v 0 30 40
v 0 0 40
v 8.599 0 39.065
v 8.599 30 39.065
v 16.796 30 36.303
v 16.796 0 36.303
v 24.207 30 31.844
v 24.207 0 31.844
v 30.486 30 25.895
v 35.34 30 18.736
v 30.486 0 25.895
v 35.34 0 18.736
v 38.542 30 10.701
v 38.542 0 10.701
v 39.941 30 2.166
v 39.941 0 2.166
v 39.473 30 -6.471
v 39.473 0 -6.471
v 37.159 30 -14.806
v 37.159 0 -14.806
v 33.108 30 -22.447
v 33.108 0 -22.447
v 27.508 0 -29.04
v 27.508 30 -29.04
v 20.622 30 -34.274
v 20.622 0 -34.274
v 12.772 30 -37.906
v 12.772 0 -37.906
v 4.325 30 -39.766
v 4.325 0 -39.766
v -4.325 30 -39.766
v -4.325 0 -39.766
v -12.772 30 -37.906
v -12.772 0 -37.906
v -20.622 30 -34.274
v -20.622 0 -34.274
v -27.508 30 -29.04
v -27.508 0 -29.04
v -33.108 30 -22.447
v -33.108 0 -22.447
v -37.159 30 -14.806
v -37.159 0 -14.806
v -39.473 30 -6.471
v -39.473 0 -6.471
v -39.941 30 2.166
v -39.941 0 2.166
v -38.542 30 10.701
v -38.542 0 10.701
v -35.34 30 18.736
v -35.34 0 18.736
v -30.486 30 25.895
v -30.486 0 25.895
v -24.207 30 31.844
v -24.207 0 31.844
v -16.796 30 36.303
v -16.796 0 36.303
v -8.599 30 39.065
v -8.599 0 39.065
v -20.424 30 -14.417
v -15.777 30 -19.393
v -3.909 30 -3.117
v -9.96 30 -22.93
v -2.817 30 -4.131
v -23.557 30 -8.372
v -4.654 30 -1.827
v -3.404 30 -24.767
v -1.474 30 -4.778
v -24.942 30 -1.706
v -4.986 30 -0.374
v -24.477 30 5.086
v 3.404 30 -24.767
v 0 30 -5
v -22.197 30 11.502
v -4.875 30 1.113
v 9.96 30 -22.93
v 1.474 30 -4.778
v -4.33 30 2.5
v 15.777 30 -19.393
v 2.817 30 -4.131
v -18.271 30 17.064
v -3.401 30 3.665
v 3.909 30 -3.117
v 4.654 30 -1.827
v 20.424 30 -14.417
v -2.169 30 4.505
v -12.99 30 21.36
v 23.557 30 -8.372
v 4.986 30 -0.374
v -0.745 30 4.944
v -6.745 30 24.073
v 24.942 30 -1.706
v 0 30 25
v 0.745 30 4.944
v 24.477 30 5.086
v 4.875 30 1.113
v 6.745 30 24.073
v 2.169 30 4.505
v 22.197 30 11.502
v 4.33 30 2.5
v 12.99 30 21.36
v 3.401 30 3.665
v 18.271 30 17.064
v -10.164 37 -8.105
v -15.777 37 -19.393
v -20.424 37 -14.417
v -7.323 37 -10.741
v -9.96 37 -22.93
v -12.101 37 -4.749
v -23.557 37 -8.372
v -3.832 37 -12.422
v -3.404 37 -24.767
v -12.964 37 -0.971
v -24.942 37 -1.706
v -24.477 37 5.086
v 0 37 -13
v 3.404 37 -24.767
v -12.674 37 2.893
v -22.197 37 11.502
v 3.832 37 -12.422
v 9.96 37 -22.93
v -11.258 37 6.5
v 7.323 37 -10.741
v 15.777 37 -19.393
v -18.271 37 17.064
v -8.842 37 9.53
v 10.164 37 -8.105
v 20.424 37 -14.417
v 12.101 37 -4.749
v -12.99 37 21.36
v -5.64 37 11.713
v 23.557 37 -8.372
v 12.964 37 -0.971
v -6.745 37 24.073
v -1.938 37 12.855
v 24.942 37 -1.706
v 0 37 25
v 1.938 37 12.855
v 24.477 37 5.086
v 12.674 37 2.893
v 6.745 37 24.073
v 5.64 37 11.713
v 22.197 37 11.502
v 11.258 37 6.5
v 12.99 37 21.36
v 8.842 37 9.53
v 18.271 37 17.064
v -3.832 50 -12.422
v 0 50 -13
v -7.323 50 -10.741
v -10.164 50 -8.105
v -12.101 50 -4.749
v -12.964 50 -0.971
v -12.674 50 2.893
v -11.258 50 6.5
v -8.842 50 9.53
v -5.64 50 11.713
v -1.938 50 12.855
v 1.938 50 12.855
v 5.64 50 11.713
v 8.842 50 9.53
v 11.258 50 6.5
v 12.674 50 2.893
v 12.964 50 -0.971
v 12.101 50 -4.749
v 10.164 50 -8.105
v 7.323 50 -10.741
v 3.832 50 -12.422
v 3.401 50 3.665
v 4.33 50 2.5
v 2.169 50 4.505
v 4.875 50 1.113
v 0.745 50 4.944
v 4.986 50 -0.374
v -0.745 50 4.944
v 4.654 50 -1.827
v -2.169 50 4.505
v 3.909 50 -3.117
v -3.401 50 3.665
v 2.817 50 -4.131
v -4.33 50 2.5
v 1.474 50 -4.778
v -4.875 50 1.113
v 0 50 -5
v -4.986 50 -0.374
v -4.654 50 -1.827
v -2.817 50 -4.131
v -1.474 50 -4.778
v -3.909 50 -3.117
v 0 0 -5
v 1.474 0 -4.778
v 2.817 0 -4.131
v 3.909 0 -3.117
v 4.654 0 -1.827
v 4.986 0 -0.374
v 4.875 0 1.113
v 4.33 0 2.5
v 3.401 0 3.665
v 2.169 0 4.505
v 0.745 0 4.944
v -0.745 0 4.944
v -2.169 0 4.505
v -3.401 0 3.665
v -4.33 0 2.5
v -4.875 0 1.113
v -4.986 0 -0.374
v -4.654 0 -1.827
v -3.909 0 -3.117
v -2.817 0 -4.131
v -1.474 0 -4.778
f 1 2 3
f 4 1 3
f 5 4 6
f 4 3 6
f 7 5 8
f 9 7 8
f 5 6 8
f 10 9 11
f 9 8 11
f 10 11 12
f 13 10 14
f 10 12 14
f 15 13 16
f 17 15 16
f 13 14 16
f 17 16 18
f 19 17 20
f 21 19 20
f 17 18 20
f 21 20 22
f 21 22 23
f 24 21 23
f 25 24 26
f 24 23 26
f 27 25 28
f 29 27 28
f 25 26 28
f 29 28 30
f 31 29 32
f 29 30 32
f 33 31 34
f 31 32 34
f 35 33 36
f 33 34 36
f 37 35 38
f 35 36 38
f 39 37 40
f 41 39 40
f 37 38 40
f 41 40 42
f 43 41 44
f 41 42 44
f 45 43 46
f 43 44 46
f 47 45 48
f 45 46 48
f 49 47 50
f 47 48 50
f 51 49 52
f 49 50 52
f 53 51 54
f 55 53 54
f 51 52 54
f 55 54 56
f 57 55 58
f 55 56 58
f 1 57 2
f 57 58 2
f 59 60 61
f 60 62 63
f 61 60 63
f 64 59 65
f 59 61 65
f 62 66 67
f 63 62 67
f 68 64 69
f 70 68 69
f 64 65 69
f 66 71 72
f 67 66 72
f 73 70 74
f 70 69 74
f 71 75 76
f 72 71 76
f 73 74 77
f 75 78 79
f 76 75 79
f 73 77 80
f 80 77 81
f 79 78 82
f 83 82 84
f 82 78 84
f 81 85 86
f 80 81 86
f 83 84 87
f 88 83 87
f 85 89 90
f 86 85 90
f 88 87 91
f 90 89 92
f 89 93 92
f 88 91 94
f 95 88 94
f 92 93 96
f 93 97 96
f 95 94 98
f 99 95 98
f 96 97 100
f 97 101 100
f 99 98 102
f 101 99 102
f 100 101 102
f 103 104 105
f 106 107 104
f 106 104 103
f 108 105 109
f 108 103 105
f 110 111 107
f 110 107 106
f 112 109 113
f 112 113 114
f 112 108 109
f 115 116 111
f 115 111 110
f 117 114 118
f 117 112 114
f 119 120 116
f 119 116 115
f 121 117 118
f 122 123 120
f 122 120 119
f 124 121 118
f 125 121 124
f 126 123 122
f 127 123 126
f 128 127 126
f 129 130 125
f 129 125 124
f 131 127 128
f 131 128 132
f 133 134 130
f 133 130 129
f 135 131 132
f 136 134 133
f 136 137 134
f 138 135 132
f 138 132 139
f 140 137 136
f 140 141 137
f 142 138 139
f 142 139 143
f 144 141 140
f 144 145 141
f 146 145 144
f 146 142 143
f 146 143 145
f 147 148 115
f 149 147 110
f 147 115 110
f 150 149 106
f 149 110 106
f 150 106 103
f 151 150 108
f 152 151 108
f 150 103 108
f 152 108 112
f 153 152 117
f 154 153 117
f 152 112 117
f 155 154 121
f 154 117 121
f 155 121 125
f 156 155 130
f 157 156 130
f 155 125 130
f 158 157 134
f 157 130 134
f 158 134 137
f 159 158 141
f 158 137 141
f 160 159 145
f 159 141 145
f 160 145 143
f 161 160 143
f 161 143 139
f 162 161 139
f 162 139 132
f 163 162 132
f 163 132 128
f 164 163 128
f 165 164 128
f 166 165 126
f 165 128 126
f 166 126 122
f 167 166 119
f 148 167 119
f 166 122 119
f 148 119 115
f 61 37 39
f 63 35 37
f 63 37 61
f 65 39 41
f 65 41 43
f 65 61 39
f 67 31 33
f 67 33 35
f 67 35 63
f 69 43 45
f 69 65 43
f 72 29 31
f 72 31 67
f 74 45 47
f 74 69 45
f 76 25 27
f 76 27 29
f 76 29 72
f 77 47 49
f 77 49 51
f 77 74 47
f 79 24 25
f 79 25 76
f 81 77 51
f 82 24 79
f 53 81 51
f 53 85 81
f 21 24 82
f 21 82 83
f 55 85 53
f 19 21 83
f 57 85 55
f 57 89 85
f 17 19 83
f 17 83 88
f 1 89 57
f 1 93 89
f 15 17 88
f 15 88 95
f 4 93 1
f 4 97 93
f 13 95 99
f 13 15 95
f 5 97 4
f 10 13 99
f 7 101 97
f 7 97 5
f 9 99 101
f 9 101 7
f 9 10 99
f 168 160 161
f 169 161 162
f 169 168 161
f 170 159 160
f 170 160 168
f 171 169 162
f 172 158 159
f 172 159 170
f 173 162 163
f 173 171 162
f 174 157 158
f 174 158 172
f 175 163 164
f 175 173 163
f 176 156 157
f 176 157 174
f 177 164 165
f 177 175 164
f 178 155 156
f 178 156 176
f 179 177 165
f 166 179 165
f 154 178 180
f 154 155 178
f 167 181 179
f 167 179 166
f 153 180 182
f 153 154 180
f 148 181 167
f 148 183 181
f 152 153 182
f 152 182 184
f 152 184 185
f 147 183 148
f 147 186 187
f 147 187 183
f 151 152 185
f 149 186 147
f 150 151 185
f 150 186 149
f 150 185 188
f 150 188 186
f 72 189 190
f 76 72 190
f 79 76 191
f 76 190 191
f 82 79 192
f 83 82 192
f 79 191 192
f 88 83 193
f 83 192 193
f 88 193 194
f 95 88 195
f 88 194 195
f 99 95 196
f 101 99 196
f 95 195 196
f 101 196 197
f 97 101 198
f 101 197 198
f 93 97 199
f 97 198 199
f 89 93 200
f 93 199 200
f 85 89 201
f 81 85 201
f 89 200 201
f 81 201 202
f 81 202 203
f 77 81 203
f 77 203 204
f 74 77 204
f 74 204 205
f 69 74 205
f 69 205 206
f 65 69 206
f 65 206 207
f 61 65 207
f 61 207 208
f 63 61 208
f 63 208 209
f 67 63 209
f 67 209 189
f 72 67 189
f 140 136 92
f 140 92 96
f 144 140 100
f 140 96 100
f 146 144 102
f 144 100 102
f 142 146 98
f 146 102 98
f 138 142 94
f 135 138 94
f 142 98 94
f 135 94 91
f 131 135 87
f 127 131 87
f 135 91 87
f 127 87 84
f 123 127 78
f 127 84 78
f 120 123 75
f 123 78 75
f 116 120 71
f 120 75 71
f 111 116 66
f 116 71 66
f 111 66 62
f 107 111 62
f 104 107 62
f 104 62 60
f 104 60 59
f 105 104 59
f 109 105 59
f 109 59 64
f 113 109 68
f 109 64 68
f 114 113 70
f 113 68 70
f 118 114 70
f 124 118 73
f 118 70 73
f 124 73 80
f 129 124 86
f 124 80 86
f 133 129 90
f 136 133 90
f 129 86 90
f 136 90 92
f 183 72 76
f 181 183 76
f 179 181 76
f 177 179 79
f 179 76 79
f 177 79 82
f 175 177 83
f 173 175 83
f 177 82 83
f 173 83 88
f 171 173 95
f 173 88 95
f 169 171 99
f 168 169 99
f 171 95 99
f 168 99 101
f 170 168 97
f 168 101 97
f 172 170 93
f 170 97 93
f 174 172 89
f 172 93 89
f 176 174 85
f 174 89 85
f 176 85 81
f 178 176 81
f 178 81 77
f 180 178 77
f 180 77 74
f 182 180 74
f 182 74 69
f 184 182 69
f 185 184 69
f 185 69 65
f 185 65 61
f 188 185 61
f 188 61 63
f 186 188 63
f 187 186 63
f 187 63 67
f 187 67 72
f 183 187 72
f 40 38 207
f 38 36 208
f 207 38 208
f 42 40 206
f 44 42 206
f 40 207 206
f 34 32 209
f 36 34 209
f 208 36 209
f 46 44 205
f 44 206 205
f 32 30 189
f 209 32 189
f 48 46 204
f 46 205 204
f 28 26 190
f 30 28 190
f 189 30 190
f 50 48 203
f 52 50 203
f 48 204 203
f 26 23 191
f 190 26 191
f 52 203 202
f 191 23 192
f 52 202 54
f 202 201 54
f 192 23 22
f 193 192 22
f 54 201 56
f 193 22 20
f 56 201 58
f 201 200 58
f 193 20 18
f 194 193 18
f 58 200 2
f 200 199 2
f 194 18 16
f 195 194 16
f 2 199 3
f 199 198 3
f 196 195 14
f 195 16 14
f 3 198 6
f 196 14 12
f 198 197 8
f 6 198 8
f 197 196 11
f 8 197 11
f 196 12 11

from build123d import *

# Parameters (mm, degrees)
SKETCH1_R           = 40
BOSS_EXTRUDE1_DEPTH = 30
SKETCH2_R           = 25
BOSS_EXTRUDE3_DEPTH = 7
SKETCH3_R           = 13
BOSS_EXTRUDE4_DEPTH = 13
SKETCH4_R           = 5
CUT_EXTRUDE2_DEPTH  = 50


with BuildPart() as part:
    # Sketch1 → Boss-Extrude1 (new body)
    with BuildSketch(Plane(origin=(0, 0, 0), x_dir=(1, 0, 0), z_dir=(0, 1, 0))):
        with Locations(Location((0, 0, 0), (0, 0, 270))):
            Circle(SKETCH1_R)
    extrude(amount=BOSS_EXTRUDE1_DEPTH)


with BuildPart() as body_2:
    # Sketch2 → Boss-Extrude3 (new body)
    with BuildSketch(Plane(origin=(0, 30, 0), x_dir=(1, 0, 0), z_dir=(0, 1, 0))):
        with Locations(Location((0, 0, 0), (0, 0, 270))):
            Circle(SKETCH2_R)
    extrude(amount=BOSS_EXTRUDE3_DEPTH)

    # Sketch3 → Boss-Extrude4 (add)
    with BuildSketch(Plane(origin=(0, 37, 0), x_dir=(1, 0, 0), z_dir=(0, 1, 0))):
        with Locations(Location((0, 0, 0), (0, 0, 90))):
            Circle(SKETCH3_R)
    extrude(amount=BOSS_EXTRUDE4_DEPTH)


with BuildPart() as cut_extrude2_tool:
    # Sketch4 → Cut-Extrude2 (new body)
    with BuildSketch(Plane.XZ):
        with Locations(Location((0, 0, 0), (0, 0, 270))):
            Circle(SKETCH4_R)
    extrude(amount=-CUT_EXTRUDE2_DEPTH)


with BuildPart() as part_1:
    add(part.part)

    # Cut-Extrude2: cut by cut_extrude2_tool
    add(cut_extrude2_tool.part, mode=Mode.SUBTRACT)


with BuildPart() as body_2_1:
    add(body_2.part)

    # Cut-Extrude2: cut by cut_extrude2_tool
    add(cut_extrude2_tool.part, mode=Mode.SUBTRACT)


solid = Compound([part_1.part, body_2_1.part])
